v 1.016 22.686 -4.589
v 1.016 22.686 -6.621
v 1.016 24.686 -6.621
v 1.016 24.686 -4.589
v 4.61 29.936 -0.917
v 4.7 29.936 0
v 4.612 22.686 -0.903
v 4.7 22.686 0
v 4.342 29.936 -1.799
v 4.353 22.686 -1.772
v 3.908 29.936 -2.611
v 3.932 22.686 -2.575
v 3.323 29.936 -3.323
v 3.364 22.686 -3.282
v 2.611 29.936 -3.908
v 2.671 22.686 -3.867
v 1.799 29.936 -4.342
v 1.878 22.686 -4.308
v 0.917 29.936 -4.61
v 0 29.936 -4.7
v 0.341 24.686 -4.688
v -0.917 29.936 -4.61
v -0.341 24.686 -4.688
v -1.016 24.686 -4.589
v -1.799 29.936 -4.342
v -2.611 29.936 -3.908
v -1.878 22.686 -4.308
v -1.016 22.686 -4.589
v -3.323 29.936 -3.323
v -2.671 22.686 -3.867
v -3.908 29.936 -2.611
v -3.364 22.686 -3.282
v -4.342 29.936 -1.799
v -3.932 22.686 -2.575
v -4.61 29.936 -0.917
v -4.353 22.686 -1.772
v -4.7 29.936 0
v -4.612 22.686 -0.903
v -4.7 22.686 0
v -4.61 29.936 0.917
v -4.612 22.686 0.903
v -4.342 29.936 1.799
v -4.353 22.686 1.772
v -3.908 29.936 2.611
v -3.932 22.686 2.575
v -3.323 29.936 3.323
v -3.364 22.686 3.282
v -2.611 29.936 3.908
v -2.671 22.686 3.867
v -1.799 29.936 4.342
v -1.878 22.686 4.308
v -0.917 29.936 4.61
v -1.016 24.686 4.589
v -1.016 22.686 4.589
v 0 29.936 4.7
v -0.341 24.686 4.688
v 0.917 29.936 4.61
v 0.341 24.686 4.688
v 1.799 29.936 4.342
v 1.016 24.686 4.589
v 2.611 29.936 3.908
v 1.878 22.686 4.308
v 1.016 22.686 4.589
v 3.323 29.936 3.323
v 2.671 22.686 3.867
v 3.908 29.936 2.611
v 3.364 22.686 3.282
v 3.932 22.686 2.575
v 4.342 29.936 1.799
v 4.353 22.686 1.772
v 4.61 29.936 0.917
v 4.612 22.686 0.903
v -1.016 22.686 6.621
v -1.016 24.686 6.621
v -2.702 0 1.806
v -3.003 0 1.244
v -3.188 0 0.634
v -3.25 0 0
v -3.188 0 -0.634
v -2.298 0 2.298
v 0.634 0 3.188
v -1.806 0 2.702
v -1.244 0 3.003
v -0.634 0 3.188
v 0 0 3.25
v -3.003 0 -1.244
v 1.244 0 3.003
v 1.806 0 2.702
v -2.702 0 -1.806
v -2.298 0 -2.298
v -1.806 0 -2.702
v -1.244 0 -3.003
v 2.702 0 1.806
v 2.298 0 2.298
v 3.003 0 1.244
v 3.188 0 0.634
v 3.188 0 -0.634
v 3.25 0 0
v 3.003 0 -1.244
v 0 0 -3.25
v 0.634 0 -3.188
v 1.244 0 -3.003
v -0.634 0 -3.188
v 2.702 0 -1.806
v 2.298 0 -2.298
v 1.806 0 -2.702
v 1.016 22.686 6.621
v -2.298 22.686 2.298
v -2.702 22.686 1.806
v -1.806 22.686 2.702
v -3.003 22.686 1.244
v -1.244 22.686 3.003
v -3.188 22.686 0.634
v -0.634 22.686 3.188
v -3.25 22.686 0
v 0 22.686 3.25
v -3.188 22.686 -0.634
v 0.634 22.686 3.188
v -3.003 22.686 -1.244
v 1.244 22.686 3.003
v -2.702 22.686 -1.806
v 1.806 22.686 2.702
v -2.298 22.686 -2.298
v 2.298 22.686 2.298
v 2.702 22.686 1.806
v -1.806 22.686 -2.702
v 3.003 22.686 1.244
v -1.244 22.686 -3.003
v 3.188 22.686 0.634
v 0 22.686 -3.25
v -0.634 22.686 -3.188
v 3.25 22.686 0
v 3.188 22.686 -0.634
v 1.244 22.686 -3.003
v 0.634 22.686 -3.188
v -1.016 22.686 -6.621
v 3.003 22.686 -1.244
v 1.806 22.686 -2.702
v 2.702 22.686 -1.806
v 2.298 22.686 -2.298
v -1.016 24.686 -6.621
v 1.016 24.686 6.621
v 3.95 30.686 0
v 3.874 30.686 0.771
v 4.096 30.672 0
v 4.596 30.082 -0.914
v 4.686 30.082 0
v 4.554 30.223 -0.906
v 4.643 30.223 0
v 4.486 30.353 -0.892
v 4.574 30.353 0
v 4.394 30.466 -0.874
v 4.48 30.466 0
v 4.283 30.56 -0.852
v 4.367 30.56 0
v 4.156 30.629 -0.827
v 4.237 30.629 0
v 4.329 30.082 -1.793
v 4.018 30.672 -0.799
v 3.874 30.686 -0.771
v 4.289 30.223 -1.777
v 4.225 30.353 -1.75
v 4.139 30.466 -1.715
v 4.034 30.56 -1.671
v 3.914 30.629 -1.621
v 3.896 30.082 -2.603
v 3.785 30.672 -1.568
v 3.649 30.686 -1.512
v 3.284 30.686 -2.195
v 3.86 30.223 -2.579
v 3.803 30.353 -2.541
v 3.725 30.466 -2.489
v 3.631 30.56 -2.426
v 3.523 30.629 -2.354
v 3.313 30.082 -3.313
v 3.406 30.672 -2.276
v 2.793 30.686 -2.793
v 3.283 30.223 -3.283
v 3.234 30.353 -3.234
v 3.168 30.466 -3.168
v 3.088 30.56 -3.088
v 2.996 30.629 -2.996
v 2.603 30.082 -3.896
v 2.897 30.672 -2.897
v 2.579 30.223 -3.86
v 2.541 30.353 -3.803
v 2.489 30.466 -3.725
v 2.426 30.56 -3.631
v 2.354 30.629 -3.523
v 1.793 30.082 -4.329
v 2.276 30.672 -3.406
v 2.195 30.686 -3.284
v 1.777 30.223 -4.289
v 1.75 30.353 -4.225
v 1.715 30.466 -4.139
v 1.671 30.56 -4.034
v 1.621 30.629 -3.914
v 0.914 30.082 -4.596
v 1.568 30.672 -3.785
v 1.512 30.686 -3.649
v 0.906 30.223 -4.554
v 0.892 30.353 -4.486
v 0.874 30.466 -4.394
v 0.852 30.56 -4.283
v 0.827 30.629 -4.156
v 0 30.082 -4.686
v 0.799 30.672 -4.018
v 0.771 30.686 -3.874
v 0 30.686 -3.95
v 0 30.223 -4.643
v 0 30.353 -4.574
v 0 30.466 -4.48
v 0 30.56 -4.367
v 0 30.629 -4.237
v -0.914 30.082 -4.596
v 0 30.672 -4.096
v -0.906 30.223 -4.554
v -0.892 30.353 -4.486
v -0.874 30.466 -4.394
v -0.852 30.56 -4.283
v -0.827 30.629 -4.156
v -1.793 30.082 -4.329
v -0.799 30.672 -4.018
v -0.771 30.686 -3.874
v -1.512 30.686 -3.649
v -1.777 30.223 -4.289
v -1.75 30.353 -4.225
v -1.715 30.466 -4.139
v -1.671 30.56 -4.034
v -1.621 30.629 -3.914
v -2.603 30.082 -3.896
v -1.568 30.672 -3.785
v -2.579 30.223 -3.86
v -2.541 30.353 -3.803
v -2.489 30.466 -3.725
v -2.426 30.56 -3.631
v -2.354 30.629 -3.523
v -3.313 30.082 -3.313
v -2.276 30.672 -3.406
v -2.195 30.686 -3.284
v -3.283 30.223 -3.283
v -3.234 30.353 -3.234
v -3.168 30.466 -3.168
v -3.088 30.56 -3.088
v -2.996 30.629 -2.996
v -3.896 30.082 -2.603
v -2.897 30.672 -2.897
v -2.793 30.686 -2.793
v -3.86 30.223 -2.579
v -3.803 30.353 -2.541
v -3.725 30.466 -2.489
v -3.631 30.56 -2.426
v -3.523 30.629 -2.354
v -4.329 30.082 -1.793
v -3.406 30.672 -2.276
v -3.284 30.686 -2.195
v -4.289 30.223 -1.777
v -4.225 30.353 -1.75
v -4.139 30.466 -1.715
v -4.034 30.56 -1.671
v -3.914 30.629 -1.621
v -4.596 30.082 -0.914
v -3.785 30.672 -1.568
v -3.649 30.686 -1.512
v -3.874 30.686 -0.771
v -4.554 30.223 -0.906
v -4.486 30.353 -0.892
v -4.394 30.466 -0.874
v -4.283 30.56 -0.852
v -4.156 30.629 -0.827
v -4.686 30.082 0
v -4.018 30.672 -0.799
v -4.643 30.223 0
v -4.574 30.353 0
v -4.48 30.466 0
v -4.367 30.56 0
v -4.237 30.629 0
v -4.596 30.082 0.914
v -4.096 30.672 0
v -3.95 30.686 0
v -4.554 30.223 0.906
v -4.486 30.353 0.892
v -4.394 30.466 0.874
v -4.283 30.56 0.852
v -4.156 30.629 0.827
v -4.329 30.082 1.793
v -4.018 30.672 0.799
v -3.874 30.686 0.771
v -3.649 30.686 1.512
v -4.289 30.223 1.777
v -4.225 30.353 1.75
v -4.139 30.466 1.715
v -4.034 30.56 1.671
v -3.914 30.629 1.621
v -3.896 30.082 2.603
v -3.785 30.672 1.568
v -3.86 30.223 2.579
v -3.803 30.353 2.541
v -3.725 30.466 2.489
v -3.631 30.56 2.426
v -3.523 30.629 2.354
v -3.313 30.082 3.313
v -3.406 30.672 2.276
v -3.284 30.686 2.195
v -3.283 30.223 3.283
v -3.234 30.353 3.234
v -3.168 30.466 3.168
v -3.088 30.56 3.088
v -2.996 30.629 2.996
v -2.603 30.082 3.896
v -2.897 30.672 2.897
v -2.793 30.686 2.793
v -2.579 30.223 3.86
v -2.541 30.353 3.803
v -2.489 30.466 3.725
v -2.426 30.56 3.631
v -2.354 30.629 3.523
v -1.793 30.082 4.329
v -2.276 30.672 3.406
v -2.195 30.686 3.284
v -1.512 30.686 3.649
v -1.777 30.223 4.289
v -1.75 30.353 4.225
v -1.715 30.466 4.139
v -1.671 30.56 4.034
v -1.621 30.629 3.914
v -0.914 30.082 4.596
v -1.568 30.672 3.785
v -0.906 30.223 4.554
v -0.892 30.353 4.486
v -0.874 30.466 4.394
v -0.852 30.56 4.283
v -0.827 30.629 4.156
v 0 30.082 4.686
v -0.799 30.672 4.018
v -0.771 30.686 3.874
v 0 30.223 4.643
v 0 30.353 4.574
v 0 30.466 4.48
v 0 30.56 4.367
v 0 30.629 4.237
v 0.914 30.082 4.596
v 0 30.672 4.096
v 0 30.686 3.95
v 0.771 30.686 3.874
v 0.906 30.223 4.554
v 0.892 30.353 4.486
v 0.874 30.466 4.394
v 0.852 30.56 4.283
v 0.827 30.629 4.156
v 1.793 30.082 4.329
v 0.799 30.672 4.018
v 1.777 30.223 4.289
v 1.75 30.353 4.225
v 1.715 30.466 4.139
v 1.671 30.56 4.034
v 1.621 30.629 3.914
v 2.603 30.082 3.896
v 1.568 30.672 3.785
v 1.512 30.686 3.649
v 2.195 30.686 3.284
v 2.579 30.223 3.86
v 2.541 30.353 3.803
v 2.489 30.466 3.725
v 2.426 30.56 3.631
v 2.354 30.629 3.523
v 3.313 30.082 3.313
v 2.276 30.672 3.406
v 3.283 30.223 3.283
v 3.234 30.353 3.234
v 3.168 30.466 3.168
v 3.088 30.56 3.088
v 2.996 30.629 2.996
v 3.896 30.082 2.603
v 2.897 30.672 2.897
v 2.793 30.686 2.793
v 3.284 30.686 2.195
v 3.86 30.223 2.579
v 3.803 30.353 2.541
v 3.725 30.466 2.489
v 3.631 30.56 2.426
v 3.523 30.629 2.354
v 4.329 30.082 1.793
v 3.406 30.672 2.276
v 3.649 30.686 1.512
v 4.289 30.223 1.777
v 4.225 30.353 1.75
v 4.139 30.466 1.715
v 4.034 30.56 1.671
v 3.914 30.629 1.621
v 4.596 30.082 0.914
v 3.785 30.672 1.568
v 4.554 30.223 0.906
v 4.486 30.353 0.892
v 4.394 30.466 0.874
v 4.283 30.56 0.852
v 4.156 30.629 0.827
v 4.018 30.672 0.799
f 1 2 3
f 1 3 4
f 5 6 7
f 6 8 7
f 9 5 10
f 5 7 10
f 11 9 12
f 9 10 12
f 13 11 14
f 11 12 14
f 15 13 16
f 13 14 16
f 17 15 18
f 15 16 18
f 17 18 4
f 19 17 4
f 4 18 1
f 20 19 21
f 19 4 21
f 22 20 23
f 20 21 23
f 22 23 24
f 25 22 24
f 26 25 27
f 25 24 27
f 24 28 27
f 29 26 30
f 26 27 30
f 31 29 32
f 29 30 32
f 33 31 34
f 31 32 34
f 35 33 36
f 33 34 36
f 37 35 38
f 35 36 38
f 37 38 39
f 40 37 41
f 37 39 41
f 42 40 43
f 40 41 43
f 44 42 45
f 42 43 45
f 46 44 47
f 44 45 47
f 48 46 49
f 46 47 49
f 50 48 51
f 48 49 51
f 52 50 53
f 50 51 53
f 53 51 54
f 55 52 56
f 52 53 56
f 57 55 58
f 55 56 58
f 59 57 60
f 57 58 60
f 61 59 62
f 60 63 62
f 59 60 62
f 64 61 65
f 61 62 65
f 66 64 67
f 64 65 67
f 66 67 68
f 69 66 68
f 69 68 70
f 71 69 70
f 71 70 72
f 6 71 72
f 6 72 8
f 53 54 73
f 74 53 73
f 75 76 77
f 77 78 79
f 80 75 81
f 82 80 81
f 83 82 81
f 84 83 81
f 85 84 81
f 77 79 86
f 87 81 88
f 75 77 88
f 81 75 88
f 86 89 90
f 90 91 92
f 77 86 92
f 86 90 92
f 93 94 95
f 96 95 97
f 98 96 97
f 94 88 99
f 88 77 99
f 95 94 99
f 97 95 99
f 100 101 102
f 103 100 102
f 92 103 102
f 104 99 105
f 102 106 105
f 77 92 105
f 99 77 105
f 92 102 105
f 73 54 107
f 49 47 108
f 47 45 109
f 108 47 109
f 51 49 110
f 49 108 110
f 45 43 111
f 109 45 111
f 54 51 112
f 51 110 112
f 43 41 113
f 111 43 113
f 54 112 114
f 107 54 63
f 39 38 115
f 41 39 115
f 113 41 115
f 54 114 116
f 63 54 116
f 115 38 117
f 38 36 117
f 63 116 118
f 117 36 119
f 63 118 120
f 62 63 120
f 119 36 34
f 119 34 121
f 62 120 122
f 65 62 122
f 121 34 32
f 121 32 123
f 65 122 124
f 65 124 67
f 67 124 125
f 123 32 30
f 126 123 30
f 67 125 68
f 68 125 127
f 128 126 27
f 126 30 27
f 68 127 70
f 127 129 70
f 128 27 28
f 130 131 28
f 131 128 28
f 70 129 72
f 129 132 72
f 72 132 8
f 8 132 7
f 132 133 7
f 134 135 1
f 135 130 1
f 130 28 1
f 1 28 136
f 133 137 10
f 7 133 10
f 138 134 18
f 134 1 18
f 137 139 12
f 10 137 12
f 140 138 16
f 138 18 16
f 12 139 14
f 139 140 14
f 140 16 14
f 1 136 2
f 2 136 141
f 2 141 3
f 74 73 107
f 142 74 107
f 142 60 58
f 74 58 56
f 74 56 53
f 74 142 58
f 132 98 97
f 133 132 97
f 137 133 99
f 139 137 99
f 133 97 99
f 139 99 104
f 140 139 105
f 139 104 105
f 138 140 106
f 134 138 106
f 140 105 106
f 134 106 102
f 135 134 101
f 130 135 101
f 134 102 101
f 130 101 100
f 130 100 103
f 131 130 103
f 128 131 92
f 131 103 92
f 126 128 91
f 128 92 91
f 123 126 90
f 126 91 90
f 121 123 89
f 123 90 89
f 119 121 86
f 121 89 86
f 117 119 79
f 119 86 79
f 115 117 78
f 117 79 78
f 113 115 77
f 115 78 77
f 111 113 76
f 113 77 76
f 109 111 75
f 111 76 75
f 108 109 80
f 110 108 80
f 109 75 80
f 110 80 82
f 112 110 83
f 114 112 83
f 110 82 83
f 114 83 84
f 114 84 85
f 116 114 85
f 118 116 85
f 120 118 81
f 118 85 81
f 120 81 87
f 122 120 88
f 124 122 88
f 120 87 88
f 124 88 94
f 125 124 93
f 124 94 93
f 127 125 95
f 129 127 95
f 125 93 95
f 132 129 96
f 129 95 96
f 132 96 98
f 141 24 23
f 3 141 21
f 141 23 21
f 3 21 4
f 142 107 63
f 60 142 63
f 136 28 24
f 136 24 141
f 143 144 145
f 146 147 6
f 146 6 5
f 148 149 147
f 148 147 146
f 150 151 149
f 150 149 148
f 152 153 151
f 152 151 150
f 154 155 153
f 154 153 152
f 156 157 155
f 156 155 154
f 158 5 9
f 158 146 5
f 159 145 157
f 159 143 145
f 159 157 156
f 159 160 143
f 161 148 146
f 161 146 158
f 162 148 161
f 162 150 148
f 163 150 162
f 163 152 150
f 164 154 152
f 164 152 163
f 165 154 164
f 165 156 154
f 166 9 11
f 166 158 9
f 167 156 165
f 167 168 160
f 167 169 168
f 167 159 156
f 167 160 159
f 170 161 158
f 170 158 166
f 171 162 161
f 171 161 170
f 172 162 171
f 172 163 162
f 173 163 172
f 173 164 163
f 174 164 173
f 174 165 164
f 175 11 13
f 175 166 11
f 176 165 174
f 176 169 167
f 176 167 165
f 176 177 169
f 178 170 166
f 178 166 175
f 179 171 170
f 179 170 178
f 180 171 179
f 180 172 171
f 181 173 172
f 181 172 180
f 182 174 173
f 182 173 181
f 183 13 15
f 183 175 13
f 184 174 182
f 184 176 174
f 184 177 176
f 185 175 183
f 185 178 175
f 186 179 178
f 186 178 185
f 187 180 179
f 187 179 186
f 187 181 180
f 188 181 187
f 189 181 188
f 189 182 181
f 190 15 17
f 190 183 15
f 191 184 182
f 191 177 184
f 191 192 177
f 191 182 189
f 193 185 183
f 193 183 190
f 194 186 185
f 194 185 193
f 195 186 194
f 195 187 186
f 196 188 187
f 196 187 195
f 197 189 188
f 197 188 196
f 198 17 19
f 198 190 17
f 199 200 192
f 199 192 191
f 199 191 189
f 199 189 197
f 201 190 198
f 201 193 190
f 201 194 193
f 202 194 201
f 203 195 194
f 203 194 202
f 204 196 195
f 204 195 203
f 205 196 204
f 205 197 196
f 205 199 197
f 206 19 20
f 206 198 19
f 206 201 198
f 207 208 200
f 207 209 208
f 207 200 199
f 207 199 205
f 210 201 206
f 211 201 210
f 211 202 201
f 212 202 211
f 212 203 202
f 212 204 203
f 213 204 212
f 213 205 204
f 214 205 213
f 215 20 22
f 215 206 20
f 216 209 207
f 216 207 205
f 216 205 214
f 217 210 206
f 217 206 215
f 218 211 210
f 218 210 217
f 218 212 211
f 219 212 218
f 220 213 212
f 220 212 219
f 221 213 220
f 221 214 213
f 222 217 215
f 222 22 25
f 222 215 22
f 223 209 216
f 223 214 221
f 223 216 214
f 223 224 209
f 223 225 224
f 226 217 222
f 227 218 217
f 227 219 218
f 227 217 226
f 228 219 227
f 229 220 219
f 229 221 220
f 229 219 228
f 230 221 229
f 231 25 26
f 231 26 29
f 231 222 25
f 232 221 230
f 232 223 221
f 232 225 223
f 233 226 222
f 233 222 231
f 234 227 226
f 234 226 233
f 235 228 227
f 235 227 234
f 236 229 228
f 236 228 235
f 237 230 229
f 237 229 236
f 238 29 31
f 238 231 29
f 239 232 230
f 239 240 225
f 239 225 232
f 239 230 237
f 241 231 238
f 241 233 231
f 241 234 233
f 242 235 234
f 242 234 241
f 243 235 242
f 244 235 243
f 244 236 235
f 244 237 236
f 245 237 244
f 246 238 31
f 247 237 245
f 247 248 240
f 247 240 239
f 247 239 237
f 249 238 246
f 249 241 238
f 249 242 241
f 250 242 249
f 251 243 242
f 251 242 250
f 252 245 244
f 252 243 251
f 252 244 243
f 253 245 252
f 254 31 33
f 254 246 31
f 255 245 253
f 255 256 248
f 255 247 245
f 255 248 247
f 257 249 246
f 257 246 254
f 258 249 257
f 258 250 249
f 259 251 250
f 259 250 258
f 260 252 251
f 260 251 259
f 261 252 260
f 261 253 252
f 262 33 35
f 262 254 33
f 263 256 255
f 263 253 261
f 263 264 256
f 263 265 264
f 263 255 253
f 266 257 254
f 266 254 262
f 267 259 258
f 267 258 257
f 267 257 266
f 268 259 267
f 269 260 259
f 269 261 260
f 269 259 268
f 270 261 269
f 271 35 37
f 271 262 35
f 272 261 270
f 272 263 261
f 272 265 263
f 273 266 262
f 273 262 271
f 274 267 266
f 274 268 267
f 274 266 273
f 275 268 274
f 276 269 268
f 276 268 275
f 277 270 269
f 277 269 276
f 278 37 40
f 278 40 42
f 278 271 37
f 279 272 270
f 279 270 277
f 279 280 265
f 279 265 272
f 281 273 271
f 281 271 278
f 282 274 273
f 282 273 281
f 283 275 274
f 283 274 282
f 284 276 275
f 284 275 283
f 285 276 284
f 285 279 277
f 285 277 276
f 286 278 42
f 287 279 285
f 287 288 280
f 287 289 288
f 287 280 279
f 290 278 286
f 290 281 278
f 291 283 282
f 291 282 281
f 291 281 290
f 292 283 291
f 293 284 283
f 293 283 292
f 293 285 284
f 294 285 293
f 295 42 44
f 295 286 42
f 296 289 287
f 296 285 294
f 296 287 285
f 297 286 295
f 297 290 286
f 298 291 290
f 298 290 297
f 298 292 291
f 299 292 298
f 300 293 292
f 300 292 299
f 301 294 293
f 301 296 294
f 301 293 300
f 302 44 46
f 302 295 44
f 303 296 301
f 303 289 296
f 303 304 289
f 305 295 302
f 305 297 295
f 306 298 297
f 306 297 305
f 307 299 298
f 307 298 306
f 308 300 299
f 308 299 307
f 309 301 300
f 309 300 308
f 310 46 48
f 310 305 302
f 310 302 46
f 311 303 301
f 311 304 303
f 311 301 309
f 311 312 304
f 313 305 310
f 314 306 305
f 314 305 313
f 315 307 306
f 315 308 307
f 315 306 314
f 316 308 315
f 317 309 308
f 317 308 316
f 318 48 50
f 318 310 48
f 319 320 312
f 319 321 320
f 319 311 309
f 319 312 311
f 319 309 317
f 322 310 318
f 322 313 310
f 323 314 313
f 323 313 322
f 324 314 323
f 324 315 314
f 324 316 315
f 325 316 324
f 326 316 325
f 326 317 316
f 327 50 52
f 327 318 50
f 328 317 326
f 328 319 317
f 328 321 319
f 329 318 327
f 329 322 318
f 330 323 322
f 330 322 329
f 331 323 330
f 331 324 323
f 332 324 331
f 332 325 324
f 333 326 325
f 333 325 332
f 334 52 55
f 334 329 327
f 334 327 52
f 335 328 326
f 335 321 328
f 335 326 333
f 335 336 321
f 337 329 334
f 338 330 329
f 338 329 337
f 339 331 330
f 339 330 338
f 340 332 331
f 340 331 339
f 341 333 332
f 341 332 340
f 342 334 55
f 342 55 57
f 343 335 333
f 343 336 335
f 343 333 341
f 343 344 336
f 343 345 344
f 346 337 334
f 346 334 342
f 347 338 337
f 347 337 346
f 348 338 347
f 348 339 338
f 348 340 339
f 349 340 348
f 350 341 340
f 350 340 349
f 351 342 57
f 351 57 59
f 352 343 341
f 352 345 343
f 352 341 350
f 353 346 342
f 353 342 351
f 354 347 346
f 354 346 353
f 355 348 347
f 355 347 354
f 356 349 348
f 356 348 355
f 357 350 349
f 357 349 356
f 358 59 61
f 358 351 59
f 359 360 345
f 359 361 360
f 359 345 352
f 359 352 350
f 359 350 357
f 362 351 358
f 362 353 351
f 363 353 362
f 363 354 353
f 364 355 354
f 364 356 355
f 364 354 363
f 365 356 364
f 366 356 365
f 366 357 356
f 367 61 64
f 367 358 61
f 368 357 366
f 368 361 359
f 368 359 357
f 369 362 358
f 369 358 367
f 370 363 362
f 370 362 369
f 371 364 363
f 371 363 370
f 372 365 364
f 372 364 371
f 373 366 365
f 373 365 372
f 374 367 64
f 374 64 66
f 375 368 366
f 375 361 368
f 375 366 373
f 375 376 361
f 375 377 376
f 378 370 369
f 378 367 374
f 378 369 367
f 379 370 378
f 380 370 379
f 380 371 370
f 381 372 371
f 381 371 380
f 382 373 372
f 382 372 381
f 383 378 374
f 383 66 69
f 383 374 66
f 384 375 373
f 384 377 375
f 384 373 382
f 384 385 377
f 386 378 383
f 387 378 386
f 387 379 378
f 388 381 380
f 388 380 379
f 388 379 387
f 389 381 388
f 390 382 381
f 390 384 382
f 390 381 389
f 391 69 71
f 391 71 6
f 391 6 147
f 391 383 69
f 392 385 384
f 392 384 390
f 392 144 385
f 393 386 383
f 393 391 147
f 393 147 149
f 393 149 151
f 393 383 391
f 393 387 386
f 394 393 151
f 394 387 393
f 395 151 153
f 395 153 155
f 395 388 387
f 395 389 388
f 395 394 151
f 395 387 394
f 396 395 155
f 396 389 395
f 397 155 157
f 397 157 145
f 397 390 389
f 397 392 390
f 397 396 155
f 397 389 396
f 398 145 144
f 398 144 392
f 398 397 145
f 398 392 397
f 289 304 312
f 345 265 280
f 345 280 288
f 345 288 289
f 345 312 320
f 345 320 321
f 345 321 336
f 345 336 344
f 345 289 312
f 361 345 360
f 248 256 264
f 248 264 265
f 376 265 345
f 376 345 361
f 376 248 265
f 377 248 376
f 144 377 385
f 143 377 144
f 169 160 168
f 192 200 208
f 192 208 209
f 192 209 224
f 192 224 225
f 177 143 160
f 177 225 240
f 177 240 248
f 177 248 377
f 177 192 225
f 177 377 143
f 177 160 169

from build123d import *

# Parameters (mm, degrees)
SKETCH1_R           = 3.25
BOSS_EXTRUDE1_DEPTH = 22.686
SKETCH6_R           = 4.7
BOSS_EXTRUDE2_DEPTH = 8
FILLET1_R           = 0.75
BOSS_EXTRUDE3_DEPTH = 2


with BuildPart() as part:
    # Sketch1 → Boss-Extrude1 (new body)
    with BuildSketch(Plane(origin=(0, 0, 0), x_dir=(1, 0, 0), z_dir=(0, 1, 0))):
        Circle(SKETCH1_R)
    extrude(amount=BOSS_EXTRUDE1_DEPTH)

    # Sketch6 → Boss-Extrude2 (add)
    with BuildSketch(Plane(origin=(0, 22.686, 0), x_dir=(1, 0, 0), z_dir=(0, 1, 0))):
        Circle(SKETCH6_R)
    extrude(amount=BOSS_EXTRUDE2_DEPTH)

    # Fillet1
    fillet1_edges = [part.edges().sort_by_distance(p)[0] for p in [
        (-4.7, 30.686, 0),
    ]]
    fillet(fillet1_edges, radius=FILLET1_R)

    # Sketch7 → Boss-Extrude3 (add)
    with BuildSketch(Plane.XZ.offset(-22.686)):
        with BuildLine():
            Line((-1.016, 4.588871757), (-1.016, 6.620871757))
            Line((-1.016, 6.620871757), (1.016, 6.620871757))
            Line((1.016, 6.620871757), (1.016, 4.588871757))
            ThreePointArc((1.016, 4.588871757), (0, 4.7), (-1.016, 4.588871757))
        make_face()
        with BuildLine():
            Line((1.016, -6.620871757), (1.016, -4.588871757))
            ThreePointArc((1.016, -4.588871757), (0, -4.7), (-1.016, -4.588871757))
            Line((-1.016, -4.588871757), (-1.016, -6.620871757))
            Line((-1.016, -6.620871757), (1.016, -6.620871757))
        make_face()
    extrude(amount=-BOSS_EXTRUDE3_DEPTH)


solid = part.part
